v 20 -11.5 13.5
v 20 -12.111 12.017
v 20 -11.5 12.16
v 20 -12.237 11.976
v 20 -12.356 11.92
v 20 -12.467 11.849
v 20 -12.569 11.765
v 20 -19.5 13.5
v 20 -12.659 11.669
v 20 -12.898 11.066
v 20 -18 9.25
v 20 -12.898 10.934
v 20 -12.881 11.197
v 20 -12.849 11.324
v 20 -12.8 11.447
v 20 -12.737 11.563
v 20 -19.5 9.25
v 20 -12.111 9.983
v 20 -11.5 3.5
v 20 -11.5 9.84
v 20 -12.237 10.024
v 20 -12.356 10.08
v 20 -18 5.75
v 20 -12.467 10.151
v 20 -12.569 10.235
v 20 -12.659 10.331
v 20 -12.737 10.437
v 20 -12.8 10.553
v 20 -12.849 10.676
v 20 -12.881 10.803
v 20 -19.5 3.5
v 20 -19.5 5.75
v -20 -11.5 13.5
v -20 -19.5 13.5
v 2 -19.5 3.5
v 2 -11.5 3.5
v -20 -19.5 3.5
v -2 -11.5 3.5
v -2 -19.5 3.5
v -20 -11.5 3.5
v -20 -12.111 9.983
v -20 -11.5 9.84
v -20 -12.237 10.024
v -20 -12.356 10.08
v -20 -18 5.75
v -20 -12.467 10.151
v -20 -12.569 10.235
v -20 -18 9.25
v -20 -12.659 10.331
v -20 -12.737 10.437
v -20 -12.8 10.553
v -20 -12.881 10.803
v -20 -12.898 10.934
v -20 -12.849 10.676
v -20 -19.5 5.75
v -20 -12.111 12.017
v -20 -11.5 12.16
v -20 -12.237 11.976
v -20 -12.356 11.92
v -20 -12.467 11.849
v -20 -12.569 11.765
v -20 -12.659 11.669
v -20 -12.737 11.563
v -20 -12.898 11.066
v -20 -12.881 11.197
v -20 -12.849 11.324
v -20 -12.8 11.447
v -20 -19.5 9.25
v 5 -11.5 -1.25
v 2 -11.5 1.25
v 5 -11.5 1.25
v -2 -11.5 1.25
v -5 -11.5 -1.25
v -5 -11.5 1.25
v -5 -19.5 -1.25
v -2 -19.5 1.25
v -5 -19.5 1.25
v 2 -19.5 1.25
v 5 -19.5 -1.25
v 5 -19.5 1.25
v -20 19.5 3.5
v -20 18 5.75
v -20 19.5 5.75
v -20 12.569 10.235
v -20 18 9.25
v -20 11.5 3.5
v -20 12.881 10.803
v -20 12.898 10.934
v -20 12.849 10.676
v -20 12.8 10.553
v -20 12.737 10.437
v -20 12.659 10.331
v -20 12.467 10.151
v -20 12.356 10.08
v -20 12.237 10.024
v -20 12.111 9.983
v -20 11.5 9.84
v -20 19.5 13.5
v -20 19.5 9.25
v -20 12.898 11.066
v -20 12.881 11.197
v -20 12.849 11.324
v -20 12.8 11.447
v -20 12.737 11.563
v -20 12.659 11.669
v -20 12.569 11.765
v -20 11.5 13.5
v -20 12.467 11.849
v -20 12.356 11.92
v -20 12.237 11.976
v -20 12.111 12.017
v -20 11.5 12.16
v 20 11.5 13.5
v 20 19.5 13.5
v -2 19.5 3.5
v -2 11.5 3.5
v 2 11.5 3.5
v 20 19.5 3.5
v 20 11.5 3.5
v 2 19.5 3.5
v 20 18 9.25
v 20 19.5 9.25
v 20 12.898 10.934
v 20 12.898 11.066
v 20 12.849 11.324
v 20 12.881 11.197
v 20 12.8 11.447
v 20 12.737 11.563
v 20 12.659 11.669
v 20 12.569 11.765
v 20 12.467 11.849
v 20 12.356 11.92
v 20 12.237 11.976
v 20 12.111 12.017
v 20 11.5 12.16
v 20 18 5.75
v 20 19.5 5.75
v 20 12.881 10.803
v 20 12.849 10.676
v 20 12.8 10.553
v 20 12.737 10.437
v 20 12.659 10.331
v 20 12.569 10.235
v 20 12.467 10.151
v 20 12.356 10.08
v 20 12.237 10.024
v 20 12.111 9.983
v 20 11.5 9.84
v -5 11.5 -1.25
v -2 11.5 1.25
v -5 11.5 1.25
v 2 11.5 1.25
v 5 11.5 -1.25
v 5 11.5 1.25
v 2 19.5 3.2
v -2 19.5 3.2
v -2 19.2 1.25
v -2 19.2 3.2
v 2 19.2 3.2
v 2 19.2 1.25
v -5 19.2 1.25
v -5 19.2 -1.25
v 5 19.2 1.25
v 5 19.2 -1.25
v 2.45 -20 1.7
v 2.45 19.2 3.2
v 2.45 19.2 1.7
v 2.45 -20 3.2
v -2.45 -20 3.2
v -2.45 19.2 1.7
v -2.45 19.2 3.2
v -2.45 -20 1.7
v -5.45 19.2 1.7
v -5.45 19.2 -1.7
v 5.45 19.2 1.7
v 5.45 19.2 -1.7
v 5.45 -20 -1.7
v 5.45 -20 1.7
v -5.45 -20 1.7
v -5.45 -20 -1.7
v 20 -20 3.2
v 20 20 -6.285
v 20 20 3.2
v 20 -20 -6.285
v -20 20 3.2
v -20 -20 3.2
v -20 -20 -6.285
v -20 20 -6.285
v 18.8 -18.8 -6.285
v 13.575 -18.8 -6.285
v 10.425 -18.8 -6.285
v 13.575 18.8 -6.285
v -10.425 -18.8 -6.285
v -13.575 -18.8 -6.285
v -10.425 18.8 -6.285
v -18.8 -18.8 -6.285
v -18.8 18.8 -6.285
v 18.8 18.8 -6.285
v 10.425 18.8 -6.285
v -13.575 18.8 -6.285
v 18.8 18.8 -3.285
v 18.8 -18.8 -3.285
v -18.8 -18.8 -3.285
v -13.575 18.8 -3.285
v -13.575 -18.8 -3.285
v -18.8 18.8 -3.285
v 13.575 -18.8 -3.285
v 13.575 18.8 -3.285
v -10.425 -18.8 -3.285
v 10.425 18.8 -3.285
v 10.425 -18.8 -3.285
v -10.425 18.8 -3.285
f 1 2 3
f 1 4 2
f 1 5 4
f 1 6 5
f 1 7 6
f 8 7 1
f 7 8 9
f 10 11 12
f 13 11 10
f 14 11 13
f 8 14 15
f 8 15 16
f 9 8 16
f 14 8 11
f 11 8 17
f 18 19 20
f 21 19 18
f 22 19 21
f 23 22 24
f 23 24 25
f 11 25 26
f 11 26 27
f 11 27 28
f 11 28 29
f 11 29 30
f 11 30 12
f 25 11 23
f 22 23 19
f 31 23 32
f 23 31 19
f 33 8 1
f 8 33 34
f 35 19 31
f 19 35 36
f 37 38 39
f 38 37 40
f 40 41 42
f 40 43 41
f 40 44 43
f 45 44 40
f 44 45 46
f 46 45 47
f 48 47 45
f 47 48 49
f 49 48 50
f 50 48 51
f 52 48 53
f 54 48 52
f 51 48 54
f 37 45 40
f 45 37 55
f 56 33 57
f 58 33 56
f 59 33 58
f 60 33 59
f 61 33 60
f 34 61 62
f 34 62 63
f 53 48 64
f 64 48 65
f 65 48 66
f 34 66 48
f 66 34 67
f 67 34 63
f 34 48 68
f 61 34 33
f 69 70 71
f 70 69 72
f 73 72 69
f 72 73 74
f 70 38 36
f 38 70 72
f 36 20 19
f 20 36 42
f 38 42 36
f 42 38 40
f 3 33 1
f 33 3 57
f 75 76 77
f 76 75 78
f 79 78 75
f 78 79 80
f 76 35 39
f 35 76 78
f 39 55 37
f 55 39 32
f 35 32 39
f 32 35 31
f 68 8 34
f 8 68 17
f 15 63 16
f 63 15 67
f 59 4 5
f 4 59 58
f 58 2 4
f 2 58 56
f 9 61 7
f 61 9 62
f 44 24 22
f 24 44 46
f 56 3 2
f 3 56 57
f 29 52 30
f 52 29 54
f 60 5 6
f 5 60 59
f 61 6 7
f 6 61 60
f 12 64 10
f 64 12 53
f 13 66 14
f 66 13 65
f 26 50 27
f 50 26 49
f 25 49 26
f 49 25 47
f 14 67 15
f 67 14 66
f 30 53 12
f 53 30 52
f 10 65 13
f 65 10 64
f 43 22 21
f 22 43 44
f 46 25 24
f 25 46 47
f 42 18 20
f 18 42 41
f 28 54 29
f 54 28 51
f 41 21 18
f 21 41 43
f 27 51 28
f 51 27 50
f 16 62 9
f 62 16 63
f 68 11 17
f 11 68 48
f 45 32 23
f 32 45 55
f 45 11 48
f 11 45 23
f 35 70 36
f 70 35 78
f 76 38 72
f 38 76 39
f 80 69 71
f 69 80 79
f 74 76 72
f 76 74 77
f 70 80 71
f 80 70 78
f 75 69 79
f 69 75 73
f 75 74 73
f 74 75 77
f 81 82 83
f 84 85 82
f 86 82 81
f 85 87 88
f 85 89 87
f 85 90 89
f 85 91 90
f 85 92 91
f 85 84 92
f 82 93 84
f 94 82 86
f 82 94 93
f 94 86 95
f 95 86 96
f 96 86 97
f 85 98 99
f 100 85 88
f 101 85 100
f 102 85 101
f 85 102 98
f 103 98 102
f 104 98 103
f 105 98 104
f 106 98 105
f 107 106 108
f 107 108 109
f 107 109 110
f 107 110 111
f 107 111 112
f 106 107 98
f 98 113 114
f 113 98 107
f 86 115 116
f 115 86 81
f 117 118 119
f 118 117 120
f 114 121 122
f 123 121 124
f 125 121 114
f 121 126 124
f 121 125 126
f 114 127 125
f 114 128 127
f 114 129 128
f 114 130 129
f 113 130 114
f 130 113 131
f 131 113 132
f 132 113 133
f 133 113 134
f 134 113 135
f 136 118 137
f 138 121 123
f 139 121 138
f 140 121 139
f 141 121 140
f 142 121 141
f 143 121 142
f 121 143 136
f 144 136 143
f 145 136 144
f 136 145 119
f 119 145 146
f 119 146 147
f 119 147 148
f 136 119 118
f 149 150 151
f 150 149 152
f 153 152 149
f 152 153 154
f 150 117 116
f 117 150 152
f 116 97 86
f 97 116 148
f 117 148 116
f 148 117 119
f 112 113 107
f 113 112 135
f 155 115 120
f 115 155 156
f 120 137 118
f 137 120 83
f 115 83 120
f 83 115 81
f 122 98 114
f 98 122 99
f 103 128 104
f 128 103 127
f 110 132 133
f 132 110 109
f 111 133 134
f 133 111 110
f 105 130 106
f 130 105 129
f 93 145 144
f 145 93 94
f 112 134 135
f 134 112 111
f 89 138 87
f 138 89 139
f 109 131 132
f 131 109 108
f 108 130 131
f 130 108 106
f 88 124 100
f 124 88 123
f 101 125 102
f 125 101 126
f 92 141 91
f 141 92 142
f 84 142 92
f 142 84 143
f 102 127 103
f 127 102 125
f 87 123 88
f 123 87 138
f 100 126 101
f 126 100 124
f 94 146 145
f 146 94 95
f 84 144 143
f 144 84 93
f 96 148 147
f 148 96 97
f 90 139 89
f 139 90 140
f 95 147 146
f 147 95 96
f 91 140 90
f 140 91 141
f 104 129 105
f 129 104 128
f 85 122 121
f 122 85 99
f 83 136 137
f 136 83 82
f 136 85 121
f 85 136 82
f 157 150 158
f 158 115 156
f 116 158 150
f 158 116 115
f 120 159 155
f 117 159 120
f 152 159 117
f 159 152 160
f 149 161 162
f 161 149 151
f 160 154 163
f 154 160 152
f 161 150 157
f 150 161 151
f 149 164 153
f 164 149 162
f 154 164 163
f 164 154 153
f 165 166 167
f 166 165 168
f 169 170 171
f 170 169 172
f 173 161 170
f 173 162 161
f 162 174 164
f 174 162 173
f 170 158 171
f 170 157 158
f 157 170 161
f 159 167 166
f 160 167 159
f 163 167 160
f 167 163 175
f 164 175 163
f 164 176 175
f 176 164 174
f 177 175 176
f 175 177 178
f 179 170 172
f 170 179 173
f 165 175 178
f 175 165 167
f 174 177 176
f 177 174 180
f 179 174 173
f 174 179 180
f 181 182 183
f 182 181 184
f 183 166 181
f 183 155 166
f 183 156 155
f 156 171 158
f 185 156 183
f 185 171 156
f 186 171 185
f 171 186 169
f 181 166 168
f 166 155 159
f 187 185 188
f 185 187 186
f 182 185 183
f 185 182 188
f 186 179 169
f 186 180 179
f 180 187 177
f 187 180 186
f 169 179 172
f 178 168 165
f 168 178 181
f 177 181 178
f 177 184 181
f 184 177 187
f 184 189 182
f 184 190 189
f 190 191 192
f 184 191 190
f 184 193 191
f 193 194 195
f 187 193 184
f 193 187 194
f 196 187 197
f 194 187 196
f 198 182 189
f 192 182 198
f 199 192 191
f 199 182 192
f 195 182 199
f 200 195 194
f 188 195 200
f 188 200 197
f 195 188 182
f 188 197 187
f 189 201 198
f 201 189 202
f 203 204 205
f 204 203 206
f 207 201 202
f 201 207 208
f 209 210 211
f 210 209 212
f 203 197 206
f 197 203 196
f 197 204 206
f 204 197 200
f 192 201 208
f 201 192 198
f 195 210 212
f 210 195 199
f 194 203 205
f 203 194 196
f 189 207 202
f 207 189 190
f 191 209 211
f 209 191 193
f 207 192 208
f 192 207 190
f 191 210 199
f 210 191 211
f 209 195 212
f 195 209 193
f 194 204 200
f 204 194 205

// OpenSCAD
/*
 * Component Holder.scad
 *
 *
 * NOTES:
 *
 * There are two different parts, the Track (with LEGO compatible fittings
 * on the bottom) and the Jaws which slide in the groove of the track and 
 * are held tight using a rubber band.
 *
 * You will need to print one track and two jaws.
 *
 * The track should be printed standing on end, and the jaws should be 
 * printed face down (with the curved PCB groove) on the bed.
 *
 * INSTRUCTIONS:
 *
 * 1. In the RENDER section set beautyRender to 1 and the rest to 0
 * 
 * 2. In SETTINGS set componentX and componentY to the size of the 
 *    PCB of the component you will be using.
 *
 * 3. In SETTINGS adjust brickX and brickY to be sized appropriately 
 *    to fit the component you added in the first step.
 * 
 * 4. If needed, change slotWidth to a number above 0 to accommodate 
 *    elements that may need clearance on the jaws.
 * 
 * 5. In the RENDER section set only trackRender to 1 and then export
 *    that, and then do the same for jawRender.
 *
 * 
 * Pete Prodoehl <pete@browndoggadgets.com>
 *
 */


/* --- SETTIINGS ---------------------------------------------------------------------------- */

// set the size of the component
componentX = 42;
componentY = 24;

// adjust for the size you need to hold the component
brickX = 5;
brickY = 5;

// do not change these values
trackWidth  = brickX * 8;   // do not change
trackLength = brickY * 8;   // do not change
trackHeight = 5.5;          // do not change
trackMidX   = 4;            // do not change
trackMidZ   = 5;            // do not change
trackBotX   = 10;           // do not change
trackBotZ   = 2.5;          // do not change

// adjust if desired to change the width of the jaws
jawWidth = trackWidth;

// adjusting only affects preview of jaws if needed
jawPreviewSpace = 4.5;  // default to 4.5

// add a slot in the jaw for some components if needed
slotWidth = 0; // set to 0 for no slot

$fn=50;


/* --- RENDER ------------------------------------------------------------------------------- */


// toggle these to affect the preview and rendering
trackRender  = 0;
jawRender    = 0;
beautyRender = 1;



// render commands
if (jawRender) {
	translate([0,0,0/2]) jawPart();
}
if (trackRender) {
	translate([0,0,0/2]) trackPart();
}
if (beautyRender) {
	translate([0,-trackLength/2+jawPreviewSpace,0]) rotate([0,0,0])   color("#0066FF") jawPart();
	translate([0,+trackLength/2-jawPreviewSpace,0]) rotate([0,0,180]) color("#0066FF") jawPart();
	translate([0,0,0]) color("#99AA00") trackPart();
	%translate([0,0,11]) cube([componentX,componentY,1.6], center=true); // component size here
}



/* --- MODULES ------------------------------------------------------------------------------ */

// jawPart is the jaws which hold the component...
//
module jawPart() {

    difference() {
        
        // top of jaw with PCB and rubber band slot cutouts
        translate([0,0,8.5])
            cube([jawWidth,8,10], center=true);
            
        // PCB slot
        hull() {
        
            translate([0,4.75,11])
                rotate([0,90,0])
                    cylinder(d=2.6, h=jawWidth+0.01, center=true);

            translate([0,3.65,11])
                rotate([0,90,0])
                    cylinder(d=2.1, h=jawWidth+0.01, center=true);                
                
        }
            
        // rubber band slot
        translate([0,-4.5,7.5])
            cube([jawWidth+0.01,4,3.5], center=true);
            
        // slot if included
        translate([0,0,13.85])
            cube([slotWidth,10,5.75], center=true);
      
    }

	// inverted T at the bottom of the jaw
    translate([0,0,0])
        guidePart();

}

/* ------------------------------------------------------------------------------------------ */

// trackPart is the basic track sized as specified
// with the guideSlot cut out from it...
//
module trackPart() {
    
    difference() {

        translate([0,0,-trackHeight/2+3.2])
            cube([trackWidth,trackLength,trackHeight], center=true);
            
        translate([0,-0.8,0])
           guideSlot();

    }
    
    // LEGO compatible bottom portion
    translate([0,0,-4.285])
        Lego_Maker(brickY, brickX);
	
} // end trackPart

/* ------------------------------------------------------------------------------------------ */

// guidePart is the inverted T at the bottom of the jaw that fits into the slot/groove
// in the trackPart which gets created by cutting out the guideSlot...
//
module guidePart() {

    variance = 0;
    trackLength = 8; 

    // middle
    translate([0,0,3])
        color("#00FF33")
            cube([trackMidX+variance,trackLength,trackMidZ+variance], center=true);
    
    // bottom
    translate([0,0,0])
        color("#33AA66")
            cube([trackBotX+variance,trackLength,trackBotZ+variance], center=true);
        
}  // end guidePart

/* ------------------------------------------------------------------------------------------ */

// guideSlot is the cutout part from the trackPart which creates the slot/groove 
// that the guidePart fits into and slides in...
//
module guideSlot() {
    
    variance = 0.9;
    
    // middle
    translate([0,0,3])
        color("#996600")
            cube([trackMidX+variance,trackLength,trackMidZ+variance], center=true);
            
    // bottom
    translate([0,0,0])
        color("#999900")
            cube([trackBotX+variance,trackLength,trackBotZ+variance], center=true);
        
}  // end guideSlot

/* ------------------------------------------------------------------------------------------ */

// Lego_Maker creates the modified LEGO brick-like part at the bottom of the holder...
//
module Lego_Maker(width, length) {

	unit_height   = 4;    // height of main brick
	unit_width    = 8;    // width of one LEGO Unit
    wall_width_x2 = 3.15; // double wall width
    
    difference() {
    
        translate([0,0,0])
            cube([length*unit_width, width*unit_width, unit_height], center=true);
    
        translate([0,0,-1])
            cube([length*unit_width-2.4, width*unit_width-2.4, unit_height], center=true);

    }
    
    translate([trackWidth/2-unit_width,0,0])
        cube([wall_width_x2, width*unit_width, unit_height], center=true);
        
    translate([-trackWidth/2+unit_width,0,0])
        cube([wall_width_x2, width*unit_width, unit_height], center=true);

}  // end Lego_Maker

/* ------------------------------------------------------------------------------------------ */
